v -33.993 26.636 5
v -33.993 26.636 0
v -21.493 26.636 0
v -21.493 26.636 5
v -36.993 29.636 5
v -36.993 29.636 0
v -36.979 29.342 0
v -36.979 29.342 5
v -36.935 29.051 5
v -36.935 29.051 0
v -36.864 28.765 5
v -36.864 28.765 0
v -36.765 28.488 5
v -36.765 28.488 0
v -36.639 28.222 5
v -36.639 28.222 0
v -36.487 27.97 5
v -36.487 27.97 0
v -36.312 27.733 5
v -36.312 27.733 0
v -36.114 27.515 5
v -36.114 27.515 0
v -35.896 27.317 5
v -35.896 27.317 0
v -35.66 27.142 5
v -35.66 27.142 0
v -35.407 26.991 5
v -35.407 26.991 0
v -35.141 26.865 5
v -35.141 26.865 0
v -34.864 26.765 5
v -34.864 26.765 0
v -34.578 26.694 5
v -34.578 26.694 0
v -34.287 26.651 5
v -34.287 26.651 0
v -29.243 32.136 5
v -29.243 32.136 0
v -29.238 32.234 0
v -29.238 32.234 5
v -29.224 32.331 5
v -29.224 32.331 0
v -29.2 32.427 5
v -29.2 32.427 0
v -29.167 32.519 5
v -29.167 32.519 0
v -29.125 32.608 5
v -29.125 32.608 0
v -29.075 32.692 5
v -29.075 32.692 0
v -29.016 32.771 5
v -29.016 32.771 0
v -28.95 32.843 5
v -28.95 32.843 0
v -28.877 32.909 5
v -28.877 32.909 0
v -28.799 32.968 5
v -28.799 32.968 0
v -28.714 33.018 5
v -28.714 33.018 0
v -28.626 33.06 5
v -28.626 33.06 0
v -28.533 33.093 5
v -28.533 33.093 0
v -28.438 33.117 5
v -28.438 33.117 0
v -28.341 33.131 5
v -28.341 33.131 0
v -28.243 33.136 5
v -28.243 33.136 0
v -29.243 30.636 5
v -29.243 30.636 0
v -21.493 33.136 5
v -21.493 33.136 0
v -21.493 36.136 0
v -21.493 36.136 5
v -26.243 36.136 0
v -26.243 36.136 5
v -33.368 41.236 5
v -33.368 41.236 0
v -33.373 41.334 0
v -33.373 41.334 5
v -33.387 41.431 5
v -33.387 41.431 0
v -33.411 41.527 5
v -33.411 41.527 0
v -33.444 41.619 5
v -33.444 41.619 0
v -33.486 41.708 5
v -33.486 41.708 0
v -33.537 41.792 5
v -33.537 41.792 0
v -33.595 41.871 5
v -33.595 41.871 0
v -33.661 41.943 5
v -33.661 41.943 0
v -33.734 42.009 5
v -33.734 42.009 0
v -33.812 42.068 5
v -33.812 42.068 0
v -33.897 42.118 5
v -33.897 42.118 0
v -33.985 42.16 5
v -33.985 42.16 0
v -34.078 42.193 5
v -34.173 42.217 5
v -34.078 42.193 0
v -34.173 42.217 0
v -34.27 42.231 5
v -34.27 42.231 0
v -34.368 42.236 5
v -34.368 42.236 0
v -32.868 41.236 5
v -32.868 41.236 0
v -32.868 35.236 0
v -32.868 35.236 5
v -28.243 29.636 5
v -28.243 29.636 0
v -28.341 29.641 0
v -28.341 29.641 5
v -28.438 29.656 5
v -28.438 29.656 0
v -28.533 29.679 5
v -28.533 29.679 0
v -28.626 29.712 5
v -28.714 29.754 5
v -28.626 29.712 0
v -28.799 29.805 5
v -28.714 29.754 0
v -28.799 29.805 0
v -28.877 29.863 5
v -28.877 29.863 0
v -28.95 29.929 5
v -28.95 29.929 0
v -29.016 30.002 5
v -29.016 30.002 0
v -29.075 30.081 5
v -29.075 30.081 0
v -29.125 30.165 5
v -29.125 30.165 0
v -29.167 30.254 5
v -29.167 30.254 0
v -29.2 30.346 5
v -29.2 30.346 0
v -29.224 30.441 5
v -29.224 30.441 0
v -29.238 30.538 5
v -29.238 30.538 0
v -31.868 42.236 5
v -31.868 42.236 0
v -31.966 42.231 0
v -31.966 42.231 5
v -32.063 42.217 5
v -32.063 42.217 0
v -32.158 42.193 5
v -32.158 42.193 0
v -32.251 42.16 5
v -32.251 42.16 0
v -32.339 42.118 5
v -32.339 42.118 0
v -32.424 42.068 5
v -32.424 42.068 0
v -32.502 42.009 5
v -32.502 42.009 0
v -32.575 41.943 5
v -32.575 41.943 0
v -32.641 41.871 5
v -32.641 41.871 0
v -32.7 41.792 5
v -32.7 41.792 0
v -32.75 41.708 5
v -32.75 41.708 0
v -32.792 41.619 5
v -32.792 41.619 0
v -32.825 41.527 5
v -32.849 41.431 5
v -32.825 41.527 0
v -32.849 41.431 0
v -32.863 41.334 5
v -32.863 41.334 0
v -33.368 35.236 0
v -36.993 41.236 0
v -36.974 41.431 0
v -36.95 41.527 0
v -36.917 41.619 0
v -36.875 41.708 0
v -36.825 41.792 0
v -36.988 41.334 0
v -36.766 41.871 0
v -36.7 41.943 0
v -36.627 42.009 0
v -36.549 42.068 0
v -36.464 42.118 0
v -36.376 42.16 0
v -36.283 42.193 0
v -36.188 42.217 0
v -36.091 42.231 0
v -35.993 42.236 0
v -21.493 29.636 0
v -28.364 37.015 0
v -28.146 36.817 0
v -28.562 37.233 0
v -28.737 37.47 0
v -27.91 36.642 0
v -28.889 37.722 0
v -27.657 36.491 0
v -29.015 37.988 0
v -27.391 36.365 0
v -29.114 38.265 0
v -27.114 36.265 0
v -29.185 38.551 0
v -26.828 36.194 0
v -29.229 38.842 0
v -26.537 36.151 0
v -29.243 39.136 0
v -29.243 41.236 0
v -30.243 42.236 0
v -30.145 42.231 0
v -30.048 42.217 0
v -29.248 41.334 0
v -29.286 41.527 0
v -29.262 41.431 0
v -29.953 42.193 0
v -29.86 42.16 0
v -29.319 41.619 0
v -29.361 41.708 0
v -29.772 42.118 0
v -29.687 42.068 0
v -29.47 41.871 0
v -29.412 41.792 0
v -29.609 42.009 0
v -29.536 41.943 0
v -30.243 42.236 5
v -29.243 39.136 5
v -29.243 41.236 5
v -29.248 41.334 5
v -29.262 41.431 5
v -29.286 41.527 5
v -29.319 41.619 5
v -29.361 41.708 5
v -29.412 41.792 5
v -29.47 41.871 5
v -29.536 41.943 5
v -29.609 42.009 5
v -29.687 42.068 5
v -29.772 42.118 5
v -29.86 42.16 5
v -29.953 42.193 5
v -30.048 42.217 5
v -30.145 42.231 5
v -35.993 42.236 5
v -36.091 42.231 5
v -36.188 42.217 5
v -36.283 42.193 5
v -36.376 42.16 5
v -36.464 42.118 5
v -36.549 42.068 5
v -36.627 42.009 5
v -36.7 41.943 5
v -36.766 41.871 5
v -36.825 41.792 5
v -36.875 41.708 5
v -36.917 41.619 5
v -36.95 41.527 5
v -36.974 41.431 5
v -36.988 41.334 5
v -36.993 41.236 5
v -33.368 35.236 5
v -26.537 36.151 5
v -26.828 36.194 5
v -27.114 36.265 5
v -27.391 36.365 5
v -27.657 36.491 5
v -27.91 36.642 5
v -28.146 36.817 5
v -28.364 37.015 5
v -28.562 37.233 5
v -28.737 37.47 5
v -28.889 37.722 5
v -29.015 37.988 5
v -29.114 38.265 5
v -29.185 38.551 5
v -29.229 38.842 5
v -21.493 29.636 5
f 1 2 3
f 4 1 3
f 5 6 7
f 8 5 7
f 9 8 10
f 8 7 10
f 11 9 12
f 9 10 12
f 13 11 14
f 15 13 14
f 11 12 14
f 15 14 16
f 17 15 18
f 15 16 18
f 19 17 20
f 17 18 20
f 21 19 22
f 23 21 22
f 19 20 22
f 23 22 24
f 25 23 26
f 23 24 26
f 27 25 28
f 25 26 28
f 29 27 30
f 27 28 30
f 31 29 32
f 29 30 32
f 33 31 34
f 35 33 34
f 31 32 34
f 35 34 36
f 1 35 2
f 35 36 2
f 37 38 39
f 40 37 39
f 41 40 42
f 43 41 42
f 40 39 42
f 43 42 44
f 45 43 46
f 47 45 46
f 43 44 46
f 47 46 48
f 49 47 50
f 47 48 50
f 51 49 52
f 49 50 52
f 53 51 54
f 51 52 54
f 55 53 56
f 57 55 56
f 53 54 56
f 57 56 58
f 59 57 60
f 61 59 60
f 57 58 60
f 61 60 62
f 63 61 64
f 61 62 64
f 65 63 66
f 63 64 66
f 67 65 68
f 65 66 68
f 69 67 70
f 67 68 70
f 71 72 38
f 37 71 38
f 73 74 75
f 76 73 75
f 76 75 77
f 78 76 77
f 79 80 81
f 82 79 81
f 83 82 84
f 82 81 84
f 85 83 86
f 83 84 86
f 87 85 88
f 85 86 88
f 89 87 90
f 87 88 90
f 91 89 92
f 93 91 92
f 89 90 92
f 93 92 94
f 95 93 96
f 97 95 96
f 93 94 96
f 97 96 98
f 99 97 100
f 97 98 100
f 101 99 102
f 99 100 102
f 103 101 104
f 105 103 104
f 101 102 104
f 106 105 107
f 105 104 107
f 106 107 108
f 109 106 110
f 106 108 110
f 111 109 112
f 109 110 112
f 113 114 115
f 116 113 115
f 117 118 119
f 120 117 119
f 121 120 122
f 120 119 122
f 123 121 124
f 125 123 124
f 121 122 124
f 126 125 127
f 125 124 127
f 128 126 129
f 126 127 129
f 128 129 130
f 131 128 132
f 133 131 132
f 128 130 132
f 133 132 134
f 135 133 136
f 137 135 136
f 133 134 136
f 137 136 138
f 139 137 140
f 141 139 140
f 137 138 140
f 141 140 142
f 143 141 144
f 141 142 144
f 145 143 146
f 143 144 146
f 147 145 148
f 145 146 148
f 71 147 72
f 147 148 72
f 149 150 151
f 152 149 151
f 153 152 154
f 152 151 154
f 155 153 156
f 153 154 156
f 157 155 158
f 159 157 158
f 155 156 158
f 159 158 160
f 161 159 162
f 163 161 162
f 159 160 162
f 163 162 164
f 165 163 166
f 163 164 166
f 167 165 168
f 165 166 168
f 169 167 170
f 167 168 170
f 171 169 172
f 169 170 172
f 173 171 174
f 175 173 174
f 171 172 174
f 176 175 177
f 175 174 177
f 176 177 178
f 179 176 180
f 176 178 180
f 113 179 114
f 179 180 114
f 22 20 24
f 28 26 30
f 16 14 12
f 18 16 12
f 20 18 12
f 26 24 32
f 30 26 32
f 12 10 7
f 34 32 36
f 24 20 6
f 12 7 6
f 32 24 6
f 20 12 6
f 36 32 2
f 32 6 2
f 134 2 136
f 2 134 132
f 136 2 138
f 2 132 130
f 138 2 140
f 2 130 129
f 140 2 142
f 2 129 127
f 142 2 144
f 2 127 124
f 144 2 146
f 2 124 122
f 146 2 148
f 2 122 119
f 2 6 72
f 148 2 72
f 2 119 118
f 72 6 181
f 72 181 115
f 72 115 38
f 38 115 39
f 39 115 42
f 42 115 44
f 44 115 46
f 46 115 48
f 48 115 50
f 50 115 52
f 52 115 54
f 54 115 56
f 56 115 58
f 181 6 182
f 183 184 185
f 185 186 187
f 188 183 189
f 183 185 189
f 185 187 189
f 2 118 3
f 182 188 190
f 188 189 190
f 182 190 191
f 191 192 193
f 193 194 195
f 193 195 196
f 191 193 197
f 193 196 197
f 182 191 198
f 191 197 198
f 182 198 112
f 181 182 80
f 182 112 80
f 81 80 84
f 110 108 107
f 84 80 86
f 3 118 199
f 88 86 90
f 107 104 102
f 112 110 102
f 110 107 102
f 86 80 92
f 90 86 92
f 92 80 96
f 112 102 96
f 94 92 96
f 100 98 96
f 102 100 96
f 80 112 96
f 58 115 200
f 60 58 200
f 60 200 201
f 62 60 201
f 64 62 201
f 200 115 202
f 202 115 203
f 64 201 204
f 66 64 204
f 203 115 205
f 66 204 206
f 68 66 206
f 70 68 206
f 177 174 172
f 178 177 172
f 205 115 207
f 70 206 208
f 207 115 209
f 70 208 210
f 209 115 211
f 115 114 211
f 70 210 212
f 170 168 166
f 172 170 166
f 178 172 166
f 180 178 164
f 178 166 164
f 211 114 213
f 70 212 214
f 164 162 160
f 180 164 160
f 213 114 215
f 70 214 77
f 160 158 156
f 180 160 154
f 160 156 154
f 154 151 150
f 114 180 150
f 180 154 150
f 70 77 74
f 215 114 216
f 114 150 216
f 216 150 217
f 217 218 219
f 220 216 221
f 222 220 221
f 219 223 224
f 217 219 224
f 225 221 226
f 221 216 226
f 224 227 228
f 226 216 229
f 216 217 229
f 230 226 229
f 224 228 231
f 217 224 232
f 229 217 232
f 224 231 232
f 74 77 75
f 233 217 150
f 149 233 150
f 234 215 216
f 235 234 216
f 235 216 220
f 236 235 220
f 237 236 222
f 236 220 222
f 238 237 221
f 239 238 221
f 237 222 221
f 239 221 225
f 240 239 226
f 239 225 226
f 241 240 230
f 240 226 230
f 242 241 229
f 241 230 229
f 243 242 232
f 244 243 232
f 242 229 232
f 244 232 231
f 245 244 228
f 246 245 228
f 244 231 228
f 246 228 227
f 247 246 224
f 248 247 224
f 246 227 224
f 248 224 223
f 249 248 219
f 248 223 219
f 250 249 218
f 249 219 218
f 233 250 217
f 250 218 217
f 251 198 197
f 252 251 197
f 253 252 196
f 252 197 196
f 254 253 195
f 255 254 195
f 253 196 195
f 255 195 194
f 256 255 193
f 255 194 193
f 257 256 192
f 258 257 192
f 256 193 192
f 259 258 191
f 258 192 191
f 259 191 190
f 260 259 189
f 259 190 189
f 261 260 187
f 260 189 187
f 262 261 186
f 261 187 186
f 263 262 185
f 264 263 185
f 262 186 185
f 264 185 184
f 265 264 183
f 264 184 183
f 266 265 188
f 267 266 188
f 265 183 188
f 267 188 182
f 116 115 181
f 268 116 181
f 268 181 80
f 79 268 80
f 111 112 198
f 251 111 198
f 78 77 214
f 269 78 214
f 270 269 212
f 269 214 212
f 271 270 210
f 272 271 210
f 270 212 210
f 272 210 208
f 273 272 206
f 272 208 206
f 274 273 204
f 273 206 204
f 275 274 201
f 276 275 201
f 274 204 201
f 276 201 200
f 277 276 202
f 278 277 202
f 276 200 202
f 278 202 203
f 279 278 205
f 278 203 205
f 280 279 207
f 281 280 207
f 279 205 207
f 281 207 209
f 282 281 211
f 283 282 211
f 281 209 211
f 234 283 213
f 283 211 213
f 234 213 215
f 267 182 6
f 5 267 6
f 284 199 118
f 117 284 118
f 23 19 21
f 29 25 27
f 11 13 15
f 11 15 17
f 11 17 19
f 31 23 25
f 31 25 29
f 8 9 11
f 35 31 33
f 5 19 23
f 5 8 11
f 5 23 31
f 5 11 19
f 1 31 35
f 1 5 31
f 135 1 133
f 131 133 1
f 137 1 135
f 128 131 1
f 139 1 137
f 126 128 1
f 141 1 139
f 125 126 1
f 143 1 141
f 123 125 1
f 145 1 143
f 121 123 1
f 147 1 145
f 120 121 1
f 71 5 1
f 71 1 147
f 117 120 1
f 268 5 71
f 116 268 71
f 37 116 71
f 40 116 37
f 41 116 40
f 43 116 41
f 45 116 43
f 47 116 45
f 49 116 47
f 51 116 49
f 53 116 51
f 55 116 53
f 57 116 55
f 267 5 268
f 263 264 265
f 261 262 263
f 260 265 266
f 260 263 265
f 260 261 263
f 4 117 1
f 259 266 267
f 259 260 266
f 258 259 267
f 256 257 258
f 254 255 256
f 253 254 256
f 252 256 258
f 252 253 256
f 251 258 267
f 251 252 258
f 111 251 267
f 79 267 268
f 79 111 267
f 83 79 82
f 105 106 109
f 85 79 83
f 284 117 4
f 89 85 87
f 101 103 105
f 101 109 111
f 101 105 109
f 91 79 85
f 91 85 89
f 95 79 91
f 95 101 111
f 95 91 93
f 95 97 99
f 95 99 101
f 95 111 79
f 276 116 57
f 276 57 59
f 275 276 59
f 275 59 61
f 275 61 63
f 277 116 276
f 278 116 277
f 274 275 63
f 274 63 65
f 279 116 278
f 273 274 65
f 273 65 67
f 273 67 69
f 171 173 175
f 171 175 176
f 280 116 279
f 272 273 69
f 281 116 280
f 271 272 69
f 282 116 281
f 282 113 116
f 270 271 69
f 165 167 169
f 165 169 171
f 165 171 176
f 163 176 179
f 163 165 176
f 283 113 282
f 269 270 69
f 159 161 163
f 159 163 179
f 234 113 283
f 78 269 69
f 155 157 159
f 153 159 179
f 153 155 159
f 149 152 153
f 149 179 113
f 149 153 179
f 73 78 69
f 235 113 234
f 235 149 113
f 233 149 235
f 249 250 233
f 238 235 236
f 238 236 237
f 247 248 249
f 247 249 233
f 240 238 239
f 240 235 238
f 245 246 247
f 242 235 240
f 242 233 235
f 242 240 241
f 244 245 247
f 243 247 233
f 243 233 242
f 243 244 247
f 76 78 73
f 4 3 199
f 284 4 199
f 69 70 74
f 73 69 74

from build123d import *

# Parameters (mm, degrees)
F1_DEPTH = 5


with BuildPart() as f1:
    # F0 (on Top) → F1 (new body)
    with BuildSketch(Plane.XY):
        with BuildLine():
            Line((-34.368042, 42.236285), (-35.993042, 42.236285))
            ThreePointArc((-35.993042, 42.236285), (-36.700148, 41.943392), (-36.993042, 41.236285))
            Line((-36.993042, 41.236285), (-36.993042, 29.636285))
            ThreePointArc((-36.993042, 29.636285), (-36.114362, 27.514965), (-33.993042, 26.636285))
            Line((-33.993042, 26.636285), (-21.493042, 26.636285))
            Line((-21.493042, 26.636285), (-21.493042, 29.636285))
            Line((-21.493042, 29.636285), (-28.243042, 29.636285))
            ThreePointArc((-28.243042, 29.636285), (-28.950148, 29.929179), (-29.243042, 30.636285))
            Line((-29.243042, 30.636285), (-29.243042, 32.136285))
            ThreePointArc((-29.243042, 32.136285), (-28.950148, 32.843392), (-28.243042, 33.136285))
            Line((-28.243042, 33.136285), (-21.493042, 33.136285))
            Line((-21.493042, 33.136285), (-21.493042, 36.136285))
            Line((-21.493042, 36.136285), (-26.243042, 36.136285))
            ThreePointArc((-26.243042, 36.136285), (-28.364362, 37.014965), (-29.243042, 39.136285))
            Line((-29.243042, 39.136285), (-29.243042, 41.236285))
            ThreePointArc((-29.243042, 41.236285), (-29.535935, 41.943392), (-30.243042, 42.236285))
            Line((-30.243042, 42.236285), (-31.868042, 42.236285))
            ThreePointArc((-31.868042, 42.236285), (-32.575148, 41.943392), (-32.868042, 41.236285))
            Line((-32.868042, 41.236285), (-32.868042, 35.236285))
            Line((-32.868042, 35.236285), (-33.368042, 35.236285))
            Line((-33.368042, 35.236285), (-33.368042, 41.236285))
            ThreePointArc((-33.368042, 41.236285), (-33.660935, 41.943392), (-34.368042, 42.236285))
        make_face()
    extrude(amount=F1_DEPTH)


solid = f1.part
